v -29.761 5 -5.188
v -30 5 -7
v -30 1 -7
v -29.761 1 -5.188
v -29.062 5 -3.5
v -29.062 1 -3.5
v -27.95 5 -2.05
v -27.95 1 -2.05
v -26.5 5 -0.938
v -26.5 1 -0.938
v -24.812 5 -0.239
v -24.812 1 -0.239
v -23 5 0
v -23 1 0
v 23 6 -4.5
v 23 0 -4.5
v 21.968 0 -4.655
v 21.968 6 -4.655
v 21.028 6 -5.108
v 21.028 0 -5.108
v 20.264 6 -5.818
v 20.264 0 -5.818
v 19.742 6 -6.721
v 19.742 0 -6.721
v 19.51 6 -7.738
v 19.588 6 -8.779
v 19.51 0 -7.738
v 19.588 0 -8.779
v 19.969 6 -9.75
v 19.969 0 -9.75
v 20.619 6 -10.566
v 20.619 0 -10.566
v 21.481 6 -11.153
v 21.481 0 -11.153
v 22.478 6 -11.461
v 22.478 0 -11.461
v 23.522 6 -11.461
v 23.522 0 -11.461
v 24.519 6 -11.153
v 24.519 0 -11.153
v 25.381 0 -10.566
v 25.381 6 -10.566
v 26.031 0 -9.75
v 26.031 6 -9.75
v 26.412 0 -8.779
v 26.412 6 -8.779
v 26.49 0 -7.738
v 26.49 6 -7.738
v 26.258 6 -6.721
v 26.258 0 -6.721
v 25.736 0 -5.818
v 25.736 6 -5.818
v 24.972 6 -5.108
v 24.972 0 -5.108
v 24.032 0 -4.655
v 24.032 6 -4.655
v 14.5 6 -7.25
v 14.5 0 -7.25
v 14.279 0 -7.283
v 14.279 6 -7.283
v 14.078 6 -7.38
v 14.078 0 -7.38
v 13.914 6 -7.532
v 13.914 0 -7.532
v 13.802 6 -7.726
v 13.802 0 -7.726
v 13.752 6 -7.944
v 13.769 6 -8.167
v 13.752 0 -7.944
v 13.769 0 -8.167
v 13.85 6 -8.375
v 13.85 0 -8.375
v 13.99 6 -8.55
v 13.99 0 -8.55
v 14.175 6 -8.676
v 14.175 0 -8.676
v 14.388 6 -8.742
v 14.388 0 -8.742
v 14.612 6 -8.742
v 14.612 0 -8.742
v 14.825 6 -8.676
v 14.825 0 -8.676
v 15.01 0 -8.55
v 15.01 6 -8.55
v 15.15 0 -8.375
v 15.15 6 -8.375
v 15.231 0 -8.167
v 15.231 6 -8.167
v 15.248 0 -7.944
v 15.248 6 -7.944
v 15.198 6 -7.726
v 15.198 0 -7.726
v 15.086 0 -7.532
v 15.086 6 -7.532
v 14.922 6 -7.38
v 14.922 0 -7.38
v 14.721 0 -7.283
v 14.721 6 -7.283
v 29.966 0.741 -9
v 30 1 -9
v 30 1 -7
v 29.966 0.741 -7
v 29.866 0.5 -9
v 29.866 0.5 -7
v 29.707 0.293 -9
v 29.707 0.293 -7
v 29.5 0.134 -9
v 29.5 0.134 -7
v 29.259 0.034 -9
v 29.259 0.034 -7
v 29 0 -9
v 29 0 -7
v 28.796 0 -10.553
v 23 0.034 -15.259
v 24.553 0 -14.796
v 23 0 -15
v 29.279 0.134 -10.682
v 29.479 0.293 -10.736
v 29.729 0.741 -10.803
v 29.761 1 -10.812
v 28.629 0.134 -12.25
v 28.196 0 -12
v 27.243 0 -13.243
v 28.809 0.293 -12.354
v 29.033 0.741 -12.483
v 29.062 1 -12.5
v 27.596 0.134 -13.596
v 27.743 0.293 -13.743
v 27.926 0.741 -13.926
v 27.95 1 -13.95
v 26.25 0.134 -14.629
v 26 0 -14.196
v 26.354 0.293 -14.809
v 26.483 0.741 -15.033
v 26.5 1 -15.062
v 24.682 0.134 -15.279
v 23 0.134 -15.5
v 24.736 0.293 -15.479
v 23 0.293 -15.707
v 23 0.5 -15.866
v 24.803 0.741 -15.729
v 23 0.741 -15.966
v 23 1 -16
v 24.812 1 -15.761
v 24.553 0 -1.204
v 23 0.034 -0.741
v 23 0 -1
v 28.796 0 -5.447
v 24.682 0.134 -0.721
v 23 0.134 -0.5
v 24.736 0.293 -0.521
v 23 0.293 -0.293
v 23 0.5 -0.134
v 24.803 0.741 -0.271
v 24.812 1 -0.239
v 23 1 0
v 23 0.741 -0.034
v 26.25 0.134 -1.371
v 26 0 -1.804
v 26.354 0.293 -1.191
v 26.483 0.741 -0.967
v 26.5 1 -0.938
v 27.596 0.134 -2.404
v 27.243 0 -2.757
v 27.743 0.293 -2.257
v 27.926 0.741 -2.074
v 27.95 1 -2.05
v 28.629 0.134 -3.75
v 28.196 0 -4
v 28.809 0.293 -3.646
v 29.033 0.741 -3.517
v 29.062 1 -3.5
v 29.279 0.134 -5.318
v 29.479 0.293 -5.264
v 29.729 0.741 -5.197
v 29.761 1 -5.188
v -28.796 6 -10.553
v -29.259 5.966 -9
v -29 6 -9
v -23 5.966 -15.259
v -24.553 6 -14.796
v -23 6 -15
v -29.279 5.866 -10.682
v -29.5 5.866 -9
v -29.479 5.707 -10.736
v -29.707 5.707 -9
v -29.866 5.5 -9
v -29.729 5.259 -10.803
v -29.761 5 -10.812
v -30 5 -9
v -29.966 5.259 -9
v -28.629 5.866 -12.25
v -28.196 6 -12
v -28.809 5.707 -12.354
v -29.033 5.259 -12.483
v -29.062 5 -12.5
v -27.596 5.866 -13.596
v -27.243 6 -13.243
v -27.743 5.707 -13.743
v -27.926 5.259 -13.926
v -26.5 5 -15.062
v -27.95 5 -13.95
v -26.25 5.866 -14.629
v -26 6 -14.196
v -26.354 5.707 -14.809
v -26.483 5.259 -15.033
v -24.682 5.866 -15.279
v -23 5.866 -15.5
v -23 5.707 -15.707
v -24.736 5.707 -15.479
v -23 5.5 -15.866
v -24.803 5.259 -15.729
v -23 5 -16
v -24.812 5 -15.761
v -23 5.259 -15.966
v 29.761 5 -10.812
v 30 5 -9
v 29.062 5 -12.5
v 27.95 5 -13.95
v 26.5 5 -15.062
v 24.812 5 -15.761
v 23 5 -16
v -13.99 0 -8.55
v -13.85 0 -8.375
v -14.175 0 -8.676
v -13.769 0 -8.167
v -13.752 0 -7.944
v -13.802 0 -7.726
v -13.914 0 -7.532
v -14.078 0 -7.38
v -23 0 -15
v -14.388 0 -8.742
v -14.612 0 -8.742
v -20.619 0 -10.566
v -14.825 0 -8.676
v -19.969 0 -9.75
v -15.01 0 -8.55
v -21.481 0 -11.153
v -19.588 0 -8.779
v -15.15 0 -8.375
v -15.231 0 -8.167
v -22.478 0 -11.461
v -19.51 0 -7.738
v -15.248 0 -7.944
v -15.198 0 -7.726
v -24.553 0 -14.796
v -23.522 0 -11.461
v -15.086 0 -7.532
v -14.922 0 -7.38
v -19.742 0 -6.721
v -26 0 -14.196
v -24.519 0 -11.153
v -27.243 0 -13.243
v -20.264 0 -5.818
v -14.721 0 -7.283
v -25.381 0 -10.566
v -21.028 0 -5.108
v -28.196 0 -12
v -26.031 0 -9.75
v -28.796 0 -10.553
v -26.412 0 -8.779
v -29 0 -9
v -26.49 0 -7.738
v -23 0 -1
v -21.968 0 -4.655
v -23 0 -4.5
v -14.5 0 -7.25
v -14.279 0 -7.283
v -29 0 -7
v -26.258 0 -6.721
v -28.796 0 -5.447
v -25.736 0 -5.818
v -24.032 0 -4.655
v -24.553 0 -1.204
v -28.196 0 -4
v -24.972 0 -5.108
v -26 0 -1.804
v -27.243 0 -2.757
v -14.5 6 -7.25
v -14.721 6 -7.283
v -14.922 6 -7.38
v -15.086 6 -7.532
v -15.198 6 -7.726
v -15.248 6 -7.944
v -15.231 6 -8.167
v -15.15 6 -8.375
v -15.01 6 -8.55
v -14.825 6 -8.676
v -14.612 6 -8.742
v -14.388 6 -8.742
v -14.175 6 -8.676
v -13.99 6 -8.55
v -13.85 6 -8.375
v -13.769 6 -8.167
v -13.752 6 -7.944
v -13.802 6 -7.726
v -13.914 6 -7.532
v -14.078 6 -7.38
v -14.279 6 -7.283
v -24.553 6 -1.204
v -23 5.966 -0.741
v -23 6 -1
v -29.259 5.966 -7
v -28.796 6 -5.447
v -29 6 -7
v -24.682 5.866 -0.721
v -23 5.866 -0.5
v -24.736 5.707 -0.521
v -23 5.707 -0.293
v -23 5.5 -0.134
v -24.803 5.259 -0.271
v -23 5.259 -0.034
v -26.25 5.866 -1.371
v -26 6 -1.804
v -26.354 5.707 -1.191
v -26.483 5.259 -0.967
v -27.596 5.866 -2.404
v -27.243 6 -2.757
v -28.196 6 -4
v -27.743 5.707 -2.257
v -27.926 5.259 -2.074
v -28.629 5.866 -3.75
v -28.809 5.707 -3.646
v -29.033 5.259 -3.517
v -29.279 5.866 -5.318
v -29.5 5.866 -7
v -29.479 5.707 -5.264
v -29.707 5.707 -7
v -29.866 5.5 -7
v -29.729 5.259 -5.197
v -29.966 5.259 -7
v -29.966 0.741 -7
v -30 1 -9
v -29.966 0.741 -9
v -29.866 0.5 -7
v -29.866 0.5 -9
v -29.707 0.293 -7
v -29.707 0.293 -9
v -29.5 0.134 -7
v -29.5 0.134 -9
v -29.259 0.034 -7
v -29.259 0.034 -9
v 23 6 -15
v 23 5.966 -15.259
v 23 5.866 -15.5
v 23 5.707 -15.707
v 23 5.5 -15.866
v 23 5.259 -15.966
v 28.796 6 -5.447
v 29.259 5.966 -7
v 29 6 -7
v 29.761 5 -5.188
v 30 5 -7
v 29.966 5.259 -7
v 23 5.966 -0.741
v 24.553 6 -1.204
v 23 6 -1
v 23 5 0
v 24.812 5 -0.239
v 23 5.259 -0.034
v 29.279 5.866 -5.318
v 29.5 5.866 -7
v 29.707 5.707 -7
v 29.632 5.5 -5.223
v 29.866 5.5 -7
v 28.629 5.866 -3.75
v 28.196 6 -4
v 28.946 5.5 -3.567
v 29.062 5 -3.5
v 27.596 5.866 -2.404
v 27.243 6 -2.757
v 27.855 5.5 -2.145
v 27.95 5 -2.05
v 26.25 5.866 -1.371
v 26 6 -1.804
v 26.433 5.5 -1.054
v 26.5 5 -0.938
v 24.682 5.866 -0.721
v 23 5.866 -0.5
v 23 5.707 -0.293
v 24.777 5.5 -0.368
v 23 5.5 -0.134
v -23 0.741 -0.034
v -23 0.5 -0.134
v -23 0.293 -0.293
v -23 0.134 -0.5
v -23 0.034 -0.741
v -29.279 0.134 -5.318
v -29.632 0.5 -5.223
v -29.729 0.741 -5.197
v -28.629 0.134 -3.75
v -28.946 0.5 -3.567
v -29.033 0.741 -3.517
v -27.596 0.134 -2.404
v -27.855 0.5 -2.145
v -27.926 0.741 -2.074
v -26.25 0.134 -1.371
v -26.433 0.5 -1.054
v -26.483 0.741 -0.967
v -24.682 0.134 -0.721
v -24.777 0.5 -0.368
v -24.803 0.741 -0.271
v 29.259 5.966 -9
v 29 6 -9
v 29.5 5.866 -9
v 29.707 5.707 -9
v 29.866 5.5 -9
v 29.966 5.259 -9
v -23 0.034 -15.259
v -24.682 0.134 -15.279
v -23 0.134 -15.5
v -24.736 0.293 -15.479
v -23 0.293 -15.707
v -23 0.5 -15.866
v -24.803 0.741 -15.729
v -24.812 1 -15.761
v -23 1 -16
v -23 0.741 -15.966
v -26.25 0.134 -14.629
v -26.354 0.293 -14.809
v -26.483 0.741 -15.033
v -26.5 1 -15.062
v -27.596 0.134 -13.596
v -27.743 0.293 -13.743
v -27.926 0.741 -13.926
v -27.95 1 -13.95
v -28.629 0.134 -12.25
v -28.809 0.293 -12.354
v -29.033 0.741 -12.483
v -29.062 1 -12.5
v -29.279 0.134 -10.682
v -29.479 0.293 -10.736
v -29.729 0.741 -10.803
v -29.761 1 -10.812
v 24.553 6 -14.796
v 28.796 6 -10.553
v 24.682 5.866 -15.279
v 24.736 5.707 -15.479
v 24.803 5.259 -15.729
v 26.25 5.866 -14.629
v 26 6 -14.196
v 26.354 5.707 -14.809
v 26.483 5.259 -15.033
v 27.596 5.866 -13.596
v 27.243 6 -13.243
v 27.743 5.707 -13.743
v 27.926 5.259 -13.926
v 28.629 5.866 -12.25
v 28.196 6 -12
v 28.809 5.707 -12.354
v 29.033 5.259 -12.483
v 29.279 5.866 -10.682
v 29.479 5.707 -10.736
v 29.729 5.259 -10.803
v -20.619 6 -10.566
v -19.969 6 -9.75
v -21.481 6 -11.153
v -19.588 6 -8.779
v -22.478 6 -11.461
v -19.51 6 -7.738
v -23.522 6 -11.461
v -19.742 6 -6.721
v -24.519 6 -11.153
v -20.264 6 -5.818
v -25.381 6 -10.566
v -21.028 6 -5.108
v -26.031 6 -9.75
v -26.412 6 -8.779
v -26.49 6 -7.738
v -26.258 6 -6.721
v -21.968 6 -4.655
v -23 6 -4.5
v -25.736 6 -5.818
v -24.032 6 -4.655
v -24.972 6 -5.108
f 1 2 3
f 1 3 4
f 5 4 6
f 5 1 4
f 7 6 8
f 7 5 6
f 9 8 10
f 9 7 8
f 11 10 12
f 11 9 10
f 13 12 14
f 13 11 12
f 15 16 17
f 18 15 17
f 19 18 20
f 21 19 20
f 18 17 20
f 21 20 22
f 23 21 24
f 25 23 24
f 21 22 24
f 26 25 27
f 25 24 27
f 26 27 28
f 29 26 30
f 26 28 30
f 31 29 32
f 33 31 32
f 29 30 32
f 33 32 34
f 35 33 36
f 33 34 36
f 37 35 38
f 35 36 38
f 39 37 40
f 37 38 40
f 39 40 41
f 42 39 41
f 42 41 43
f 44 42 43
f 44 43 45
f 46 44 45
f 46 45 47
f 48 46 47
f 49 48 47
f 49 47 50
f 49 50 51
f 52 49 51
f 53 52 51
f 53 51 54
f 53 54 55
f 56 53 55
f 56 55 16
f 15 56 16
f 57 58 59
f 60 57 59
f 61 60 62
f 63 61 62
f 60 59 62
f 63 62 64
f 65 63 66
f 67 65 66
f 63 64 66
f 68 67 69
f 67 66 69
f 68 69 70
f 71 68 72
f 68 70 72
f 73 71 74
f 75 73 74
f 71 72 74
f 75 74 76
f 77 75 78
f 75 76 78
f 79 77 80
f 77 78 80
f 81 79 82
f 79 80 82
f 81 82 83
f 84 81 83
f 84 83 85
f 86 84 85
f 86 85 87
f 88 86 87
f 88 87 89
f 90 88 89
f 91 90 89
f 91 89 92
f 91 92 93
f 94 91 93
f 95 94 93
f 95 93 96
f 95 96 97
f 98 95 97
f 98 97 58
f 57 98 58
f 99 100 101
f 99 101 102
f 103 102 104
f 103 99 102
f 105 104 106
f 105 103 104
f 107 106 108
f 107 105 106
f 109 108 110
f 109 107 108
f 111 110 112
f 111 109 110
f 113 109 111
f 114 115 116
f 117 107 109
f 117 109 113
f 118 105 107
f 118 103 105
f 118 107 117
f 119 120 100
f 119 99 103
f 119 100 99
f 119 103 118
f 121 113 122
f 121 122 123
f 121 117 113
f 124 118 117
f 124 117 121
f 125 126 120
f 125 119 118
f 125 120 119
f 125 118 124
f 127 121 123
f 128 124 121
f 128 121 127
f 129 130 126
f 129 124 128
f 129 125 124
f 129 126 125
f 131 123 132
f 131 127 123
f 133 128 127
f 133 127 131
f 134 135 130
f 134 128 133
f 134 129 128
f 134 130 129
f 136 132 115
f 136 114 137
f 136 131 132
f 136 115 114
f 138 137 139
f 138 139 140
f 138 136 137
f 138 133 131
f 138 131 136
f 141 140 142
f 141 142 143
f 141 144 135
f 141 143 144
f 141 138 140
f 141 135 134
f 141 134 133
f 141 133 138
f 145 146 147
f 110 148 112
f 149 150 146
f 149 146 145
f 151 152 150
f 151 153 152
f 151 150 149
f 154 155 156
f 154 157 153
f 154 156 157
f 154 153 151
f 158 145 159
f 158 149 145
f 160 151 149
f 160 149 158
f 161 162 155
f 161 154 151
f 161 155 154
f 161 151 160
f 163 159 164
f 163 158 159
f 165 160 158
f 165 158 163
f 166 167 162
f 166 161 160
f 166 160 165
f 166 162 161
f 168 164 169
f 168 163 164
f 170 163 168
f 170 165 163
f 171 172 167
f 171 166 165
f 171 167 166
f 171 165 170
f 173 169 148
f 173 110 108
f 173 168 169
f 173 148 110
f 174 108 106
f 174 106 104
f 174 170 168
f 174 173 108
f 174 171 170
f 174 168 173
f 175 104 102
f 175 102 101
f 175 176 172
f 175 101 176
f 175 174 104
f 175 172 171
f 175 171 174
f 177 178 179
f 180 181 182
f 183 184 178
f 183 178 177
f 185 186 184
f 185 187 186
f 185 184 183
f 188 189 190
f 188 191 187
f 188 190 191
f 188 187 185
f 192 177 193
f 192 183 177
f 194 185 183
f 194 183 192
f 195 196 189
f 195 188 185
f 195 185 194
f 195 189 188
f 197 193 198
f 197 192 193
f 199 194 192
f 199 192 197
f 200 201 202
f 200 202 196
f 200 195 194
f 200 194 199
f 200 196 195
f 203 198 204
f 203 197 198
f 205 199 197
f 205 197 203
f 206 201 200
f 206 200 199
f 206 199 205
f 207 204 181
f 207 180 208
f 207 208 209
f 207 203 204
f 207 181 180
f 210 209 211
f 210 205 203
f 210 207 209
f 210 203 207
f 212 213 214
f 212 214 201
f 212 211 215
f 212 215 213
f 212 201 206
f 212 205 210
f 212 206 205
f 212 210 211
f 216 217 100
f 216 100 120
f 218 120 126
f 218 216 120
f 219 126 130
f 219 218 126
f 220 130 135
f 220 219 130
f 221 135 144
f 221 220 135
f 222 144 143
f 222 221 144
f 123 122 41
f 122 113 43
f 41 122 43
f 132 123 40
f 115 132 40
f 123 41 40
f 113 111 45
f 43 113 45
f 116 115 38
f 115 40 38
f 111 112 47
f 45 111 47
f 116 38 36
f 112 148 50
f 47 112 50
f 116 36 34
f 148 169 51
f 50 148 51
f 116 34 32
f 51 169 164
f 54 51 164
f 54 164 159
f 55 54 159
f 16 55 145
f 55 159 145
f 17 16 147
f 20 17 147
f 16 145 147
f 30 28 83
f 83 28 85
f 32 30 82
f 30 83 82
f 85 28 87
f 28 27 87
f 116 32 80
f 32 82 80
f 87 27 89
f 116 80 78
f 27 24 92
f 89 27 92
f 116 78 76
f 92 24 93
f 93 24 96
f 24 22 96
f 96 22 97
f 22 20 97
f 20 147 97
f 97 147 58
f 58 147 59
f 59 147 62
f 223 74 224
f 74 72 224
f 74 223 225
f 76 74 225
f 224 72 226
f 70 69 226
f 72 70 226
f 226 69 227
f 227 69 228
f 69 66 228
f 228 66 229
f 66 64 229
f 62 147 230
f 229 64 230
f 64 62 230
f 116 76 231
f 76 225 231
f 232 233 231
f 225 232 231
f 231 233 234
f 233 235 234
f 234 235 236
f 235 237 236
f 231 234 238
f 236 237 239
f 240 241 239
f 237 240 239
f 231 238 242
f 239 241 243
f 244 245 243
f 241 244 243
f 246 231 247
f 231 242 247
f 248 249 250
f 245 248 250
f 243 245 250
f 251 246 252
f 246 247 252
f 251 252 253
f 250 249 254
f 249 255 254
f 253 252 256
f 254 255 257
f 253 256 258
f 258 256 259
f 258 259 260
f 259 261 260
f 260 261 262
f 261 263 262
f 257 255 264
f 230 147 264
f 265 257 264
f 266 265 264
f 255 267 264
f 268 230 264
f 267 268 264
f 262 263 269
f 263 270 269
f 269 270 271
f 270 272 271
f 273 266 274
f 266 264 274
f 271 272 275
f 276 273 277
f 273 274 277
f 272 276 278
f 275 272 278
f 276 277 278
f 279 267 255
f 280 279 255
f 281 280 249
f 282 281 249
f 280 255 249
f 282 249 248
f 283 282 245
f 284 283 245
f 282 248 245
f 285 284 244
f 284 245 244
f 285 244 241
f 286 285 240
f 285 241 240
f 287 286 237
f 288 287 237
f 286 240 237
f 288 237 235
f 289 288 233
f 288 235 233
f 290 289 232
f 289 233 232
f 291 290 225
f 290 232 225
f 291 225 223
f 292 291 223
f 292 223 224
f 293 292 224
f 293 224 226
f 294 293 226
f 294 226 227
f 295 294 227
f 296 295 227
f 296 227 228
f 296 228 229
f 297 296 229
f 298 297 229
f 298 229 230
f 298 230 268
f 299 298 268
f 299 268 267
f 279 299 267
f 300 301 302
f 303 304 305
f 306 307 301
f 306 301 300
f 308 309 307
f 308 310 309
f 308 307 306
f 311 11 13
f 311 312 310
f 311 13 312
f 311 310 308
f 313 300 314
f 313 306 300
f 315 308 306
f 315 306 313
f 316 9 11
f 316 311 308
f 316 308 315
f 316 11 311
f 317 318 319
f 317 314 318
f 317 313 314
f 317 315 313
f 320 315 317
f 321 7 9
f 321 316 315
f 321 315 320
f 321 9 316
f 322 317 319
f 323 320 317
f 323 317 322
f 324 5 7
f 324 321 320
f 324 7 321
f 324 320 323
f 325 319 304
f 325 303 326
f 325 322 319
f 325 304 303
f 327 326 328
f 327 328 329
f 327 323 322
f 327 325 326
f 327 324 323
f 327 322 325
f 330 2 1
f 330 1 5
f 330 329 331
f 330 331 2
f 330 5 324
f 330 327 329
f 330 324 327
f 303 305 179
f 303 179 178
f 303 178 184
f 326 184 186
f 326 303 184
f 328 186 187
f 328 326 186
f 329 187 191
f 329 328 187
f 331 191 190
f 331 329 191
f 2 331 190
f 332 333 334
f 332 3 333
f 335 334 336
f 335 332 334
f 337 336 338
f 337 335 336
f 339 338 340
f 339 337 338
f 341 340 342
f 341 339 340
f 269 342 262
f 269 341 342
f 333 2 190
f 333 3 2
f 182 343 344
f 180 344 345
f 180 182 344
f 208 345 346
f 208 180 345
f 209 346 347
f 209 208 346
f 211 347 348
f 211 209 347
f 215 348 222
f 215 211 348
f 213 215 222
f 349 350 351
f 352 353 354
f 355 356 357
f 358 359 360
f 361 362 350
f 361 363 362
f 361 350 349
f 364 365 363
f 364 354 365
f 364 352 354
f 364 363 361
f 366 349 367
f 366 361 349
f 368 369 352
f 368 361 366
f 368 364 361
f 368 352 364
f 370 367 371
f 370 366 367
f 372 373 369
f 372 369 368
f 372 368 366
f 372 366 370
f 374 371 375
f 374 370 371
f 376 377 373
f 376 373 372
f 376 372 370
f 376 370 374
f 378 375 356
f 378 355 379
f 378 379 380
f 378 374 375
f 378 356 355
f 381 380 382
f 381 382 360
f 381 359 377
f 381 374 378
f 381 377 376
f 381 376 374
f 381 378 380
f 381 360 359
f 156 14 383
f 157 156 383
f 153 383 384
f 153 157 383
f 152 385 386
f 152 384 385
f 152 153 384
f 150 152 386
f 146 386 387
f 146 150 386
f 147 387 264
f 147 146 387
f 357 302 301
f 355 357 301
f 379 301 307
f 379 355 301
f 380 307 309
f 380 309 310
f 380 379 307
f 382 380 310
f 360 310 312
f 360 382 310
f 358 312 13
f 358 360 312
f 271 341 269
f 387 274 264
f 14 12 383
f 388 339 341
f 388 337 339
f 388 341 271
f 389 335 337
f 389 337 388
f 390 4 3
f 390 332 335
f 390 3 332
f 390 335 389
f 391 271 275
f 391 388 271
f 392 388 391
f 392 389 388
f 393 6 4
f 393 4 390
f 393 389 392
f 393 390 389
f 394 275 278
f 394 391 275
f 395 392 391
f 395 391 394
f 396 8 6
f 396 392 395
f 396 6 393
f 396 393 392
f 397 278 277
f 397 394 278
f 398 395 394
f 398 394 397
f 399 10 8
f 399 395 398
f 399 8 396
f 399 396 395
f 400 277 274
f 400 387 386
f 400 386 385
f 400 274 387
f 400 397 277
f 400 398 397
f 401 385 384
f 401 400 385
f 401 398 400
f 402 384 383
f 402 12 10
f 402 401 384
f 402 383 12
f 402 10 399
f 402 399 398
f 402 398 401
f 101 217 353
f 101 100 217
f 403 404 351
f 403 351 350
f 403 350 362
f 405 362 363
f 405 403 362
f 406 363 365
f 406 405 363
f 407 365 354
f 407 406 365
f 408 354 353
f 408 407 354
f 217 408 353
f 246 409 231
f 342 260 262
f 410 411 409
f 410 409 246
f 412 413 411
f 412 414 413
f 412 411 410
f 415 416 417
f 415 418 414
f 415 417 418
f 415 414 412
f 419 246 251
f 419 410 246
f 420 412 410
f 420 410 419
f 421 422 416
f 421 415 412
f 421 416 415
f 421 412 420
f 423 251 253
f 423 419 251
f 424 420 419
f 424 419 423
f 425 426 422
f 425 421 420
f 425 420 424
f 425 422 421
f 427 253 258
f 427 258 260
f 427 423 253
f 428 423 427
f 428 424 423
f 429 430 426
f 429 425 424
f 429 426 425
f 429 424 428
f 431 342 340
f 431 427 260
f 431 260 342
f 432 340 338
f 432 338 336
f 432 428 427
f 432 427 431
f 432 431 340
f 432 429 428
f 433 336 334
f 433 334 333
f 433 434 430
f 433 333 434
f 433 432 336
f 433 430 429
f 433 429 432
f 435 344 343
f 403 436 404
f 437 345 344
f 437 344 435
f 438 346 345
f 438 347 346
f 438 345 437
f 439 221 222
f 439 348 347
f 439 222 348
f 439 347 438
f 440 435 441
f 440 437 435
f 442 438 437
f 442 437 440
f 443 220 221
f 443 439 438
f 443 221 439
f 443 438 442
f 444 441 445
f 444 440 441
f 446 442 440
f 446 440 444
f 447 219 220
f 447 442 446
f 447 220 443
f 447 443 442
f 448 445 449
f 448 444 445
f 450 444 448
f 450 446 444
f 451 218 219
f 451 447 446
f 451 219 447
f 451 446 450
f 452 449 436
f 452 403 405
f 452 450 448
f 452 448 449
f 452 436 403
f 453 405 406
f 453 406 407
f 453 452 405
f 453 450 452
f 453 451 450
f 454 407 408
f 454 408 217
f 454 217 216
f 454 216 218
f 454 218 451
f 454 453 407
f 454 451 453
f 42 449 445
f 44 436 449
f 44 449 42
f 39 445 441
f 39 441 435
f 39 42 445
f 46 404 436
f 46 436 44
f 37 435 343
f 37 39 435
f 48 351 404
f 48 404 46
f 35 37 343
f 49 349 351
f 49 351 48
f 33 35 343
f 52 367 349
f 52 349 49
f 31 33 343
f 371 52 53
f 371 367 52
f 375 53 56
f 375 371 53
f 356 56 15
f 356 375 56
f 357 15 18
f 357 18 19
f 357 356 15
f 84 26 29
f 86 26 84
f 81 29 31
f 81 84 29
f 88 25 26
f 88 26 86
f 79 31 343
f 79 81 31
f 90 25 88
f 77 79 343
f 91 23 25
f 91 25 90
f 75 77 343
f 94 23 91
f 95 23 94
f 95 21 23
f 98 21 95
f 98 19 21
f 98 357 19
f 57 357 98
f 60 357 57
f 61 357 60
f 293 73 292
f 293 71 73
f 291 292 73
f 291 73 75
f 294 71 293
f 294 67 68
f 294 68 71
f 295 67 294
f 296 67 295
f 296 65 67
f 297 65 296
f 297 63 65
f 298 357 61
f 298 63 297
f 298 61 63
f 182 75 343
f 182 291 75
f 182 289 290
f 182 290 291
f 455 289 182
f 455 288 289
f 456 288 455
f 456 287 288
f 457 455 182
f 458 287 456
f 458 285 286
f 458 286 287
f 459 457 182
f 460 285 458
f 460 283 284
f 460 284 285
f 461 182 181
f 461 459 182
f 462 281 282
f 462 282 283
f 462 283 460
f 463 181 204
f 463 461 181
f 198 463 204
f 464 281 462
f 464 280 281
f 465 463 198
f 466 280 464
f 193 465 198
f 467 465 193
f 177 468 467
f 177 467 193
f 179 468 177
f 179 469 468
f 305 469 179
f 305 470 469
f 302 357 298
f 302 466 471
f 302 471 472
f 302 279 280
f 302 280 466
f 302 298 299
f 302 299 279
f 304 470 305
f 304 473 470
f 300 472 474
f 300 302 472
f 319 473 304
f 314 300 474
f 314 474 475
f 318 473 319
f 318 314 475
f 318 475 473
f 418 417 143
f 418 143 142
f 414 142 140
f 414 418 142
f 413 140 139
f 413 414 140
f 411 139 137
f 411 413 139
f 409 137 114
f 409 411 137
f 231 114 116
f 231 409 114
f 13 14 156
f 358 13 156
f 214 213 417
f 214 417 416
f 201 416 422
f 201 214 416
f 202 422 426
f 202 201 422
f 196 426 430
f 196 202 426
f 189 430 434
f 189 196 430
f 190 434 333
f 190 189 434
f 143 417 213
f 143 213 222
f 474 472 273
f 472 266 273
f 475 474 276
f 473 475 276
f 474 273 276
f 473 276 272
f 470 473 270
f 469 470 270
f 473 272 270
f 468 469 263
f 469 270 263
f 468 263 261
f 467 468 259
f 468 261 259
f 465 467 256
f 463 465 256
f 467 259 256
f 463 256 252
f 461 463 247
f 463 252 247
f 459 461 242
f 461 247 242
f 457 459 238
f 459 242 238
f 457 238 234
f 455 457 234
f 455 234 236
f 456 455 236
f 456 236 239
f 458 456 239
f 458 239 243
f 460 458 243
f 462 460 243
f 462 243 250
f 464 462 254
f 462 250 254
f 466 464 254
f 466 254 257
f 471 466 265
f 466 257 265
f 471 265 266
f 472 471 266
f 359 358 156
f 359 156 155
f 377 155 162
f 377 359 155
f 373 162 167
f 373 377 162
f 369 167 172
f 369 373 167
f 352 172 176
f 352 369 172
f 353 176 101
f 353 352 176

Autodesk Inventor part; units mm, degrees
ref_plane "YZ Plane" through (0, 0, 0) normal (1, 0, 0) x (0, 1, 0)
ref_plane "XZ Plane" through (0, 0, 0) normal (0, 1, 0) x (-1, 0, 0)
ref_plane "XY Plane" through (0, 0, 0) normal (0, 0, 1) x (1, 0, 0)
sketch "Sketch1" plane through (0, 0, 0) normal (0, 1, 0) x (-1, 0, 0)
  line L0 (42, 0) -> (-42, 0) projected
  line L1 (0, -19.2) -> (0, 3.2) projected
  line L2 (30, -16) -> (-30, -16)
  line L3 (-30, -16) -> (-30, 0)
  line L4 (-30, 0) -> (30, 0)
  line L5 (30, 0) -> (30, -16)
  point P0 (0, 0)
  dimension "d0" = 16
  dimension "d1" = 60
extrude "Extrusion1" add sketch "Sketch1" along normal blind 6
sketch "Sketch2" plane through (0, 6, 0) normal (0, 1, 0) x (1, 0, 0)
  line L0 (30, 16) -> (-30, 16) projected
  line L1 (-30, 16) -> (-30, 0) projected
  line L2 (-30, 0) -> (30, 0) projected
  line L3 (30, 0) -> (30, 16) projected
  line L4 (0, 19.2) -> (0, -3.2) projected
  line L5 (-42, 0) -> (42, 0) projected
  point P0 (0, 0)
  point P1 (-23, 8)
  point P2 (23, 8)
  dimension "d4" = 7
  dimension "d5" = 7
  dimension "d6" = 8
  dimension "d7" = 8
hole "Hole1" at (23, 6, -8) at (-23, 6, -8) direction (0, -1, 0) diameter 7 end through all
sketch "Sketch3" plane through (0, 6, 0) normal (0, 1, 0) x (1, 0, 0)
  circle A0 centre (23, 8) radius 3.5 projected
  circle A1 centre (-23, 8) radius 3.5 projected
  line L0 (30, 16) -> (-30, 16) projected
  line L1 (-30, 16) -> (-30, 0) projected
  line L2 (-30, 0) -> (30, 0) projected
  line L3 (30, 0) -> (30, 16) projected
  line L4 (0, 19.2) -> (0, -3.2) projected
  line L5 (-23, 8) -> (23, 8) construction
  point P0 (0, 0)
  point P1 (-14.5, 8)
  point P2 (14.5, 8)
  dimension "d15" = 8.5
  dimension "d16" = 8.5
hole "Hole2" at (-14.5, 6, -8) at (14.5, 6, -8) direction (0, -1, 0) diameter 1.5 end through all
fillet "Fillet1" radius 7 4 edges at (30, 3, -16) (30, 3, 0) (-30, 3, -16) (-30, 3, 0)
fillet "Fillet2" radius 1 16 edges at (0, 0, 0) (-27.9497, 0, -2.0503) (-30, 0, -8) (-27.9497, 0, -13.9497) (0, 0, -16) (27.9497, 0, -13.9497) (30, 0, -8) (27.9497, 0, -2.0503) (27.9497, 6, -2.0503) (30, 6, -8) (27.9497, 6, -13.9497) (0, 6, -16) (-27.9497, 6, -13.9497) (-30, 6, -8) (-27.9497, 6, -2.0503) (0, 6, 0)
properties part number "femur_v3"
